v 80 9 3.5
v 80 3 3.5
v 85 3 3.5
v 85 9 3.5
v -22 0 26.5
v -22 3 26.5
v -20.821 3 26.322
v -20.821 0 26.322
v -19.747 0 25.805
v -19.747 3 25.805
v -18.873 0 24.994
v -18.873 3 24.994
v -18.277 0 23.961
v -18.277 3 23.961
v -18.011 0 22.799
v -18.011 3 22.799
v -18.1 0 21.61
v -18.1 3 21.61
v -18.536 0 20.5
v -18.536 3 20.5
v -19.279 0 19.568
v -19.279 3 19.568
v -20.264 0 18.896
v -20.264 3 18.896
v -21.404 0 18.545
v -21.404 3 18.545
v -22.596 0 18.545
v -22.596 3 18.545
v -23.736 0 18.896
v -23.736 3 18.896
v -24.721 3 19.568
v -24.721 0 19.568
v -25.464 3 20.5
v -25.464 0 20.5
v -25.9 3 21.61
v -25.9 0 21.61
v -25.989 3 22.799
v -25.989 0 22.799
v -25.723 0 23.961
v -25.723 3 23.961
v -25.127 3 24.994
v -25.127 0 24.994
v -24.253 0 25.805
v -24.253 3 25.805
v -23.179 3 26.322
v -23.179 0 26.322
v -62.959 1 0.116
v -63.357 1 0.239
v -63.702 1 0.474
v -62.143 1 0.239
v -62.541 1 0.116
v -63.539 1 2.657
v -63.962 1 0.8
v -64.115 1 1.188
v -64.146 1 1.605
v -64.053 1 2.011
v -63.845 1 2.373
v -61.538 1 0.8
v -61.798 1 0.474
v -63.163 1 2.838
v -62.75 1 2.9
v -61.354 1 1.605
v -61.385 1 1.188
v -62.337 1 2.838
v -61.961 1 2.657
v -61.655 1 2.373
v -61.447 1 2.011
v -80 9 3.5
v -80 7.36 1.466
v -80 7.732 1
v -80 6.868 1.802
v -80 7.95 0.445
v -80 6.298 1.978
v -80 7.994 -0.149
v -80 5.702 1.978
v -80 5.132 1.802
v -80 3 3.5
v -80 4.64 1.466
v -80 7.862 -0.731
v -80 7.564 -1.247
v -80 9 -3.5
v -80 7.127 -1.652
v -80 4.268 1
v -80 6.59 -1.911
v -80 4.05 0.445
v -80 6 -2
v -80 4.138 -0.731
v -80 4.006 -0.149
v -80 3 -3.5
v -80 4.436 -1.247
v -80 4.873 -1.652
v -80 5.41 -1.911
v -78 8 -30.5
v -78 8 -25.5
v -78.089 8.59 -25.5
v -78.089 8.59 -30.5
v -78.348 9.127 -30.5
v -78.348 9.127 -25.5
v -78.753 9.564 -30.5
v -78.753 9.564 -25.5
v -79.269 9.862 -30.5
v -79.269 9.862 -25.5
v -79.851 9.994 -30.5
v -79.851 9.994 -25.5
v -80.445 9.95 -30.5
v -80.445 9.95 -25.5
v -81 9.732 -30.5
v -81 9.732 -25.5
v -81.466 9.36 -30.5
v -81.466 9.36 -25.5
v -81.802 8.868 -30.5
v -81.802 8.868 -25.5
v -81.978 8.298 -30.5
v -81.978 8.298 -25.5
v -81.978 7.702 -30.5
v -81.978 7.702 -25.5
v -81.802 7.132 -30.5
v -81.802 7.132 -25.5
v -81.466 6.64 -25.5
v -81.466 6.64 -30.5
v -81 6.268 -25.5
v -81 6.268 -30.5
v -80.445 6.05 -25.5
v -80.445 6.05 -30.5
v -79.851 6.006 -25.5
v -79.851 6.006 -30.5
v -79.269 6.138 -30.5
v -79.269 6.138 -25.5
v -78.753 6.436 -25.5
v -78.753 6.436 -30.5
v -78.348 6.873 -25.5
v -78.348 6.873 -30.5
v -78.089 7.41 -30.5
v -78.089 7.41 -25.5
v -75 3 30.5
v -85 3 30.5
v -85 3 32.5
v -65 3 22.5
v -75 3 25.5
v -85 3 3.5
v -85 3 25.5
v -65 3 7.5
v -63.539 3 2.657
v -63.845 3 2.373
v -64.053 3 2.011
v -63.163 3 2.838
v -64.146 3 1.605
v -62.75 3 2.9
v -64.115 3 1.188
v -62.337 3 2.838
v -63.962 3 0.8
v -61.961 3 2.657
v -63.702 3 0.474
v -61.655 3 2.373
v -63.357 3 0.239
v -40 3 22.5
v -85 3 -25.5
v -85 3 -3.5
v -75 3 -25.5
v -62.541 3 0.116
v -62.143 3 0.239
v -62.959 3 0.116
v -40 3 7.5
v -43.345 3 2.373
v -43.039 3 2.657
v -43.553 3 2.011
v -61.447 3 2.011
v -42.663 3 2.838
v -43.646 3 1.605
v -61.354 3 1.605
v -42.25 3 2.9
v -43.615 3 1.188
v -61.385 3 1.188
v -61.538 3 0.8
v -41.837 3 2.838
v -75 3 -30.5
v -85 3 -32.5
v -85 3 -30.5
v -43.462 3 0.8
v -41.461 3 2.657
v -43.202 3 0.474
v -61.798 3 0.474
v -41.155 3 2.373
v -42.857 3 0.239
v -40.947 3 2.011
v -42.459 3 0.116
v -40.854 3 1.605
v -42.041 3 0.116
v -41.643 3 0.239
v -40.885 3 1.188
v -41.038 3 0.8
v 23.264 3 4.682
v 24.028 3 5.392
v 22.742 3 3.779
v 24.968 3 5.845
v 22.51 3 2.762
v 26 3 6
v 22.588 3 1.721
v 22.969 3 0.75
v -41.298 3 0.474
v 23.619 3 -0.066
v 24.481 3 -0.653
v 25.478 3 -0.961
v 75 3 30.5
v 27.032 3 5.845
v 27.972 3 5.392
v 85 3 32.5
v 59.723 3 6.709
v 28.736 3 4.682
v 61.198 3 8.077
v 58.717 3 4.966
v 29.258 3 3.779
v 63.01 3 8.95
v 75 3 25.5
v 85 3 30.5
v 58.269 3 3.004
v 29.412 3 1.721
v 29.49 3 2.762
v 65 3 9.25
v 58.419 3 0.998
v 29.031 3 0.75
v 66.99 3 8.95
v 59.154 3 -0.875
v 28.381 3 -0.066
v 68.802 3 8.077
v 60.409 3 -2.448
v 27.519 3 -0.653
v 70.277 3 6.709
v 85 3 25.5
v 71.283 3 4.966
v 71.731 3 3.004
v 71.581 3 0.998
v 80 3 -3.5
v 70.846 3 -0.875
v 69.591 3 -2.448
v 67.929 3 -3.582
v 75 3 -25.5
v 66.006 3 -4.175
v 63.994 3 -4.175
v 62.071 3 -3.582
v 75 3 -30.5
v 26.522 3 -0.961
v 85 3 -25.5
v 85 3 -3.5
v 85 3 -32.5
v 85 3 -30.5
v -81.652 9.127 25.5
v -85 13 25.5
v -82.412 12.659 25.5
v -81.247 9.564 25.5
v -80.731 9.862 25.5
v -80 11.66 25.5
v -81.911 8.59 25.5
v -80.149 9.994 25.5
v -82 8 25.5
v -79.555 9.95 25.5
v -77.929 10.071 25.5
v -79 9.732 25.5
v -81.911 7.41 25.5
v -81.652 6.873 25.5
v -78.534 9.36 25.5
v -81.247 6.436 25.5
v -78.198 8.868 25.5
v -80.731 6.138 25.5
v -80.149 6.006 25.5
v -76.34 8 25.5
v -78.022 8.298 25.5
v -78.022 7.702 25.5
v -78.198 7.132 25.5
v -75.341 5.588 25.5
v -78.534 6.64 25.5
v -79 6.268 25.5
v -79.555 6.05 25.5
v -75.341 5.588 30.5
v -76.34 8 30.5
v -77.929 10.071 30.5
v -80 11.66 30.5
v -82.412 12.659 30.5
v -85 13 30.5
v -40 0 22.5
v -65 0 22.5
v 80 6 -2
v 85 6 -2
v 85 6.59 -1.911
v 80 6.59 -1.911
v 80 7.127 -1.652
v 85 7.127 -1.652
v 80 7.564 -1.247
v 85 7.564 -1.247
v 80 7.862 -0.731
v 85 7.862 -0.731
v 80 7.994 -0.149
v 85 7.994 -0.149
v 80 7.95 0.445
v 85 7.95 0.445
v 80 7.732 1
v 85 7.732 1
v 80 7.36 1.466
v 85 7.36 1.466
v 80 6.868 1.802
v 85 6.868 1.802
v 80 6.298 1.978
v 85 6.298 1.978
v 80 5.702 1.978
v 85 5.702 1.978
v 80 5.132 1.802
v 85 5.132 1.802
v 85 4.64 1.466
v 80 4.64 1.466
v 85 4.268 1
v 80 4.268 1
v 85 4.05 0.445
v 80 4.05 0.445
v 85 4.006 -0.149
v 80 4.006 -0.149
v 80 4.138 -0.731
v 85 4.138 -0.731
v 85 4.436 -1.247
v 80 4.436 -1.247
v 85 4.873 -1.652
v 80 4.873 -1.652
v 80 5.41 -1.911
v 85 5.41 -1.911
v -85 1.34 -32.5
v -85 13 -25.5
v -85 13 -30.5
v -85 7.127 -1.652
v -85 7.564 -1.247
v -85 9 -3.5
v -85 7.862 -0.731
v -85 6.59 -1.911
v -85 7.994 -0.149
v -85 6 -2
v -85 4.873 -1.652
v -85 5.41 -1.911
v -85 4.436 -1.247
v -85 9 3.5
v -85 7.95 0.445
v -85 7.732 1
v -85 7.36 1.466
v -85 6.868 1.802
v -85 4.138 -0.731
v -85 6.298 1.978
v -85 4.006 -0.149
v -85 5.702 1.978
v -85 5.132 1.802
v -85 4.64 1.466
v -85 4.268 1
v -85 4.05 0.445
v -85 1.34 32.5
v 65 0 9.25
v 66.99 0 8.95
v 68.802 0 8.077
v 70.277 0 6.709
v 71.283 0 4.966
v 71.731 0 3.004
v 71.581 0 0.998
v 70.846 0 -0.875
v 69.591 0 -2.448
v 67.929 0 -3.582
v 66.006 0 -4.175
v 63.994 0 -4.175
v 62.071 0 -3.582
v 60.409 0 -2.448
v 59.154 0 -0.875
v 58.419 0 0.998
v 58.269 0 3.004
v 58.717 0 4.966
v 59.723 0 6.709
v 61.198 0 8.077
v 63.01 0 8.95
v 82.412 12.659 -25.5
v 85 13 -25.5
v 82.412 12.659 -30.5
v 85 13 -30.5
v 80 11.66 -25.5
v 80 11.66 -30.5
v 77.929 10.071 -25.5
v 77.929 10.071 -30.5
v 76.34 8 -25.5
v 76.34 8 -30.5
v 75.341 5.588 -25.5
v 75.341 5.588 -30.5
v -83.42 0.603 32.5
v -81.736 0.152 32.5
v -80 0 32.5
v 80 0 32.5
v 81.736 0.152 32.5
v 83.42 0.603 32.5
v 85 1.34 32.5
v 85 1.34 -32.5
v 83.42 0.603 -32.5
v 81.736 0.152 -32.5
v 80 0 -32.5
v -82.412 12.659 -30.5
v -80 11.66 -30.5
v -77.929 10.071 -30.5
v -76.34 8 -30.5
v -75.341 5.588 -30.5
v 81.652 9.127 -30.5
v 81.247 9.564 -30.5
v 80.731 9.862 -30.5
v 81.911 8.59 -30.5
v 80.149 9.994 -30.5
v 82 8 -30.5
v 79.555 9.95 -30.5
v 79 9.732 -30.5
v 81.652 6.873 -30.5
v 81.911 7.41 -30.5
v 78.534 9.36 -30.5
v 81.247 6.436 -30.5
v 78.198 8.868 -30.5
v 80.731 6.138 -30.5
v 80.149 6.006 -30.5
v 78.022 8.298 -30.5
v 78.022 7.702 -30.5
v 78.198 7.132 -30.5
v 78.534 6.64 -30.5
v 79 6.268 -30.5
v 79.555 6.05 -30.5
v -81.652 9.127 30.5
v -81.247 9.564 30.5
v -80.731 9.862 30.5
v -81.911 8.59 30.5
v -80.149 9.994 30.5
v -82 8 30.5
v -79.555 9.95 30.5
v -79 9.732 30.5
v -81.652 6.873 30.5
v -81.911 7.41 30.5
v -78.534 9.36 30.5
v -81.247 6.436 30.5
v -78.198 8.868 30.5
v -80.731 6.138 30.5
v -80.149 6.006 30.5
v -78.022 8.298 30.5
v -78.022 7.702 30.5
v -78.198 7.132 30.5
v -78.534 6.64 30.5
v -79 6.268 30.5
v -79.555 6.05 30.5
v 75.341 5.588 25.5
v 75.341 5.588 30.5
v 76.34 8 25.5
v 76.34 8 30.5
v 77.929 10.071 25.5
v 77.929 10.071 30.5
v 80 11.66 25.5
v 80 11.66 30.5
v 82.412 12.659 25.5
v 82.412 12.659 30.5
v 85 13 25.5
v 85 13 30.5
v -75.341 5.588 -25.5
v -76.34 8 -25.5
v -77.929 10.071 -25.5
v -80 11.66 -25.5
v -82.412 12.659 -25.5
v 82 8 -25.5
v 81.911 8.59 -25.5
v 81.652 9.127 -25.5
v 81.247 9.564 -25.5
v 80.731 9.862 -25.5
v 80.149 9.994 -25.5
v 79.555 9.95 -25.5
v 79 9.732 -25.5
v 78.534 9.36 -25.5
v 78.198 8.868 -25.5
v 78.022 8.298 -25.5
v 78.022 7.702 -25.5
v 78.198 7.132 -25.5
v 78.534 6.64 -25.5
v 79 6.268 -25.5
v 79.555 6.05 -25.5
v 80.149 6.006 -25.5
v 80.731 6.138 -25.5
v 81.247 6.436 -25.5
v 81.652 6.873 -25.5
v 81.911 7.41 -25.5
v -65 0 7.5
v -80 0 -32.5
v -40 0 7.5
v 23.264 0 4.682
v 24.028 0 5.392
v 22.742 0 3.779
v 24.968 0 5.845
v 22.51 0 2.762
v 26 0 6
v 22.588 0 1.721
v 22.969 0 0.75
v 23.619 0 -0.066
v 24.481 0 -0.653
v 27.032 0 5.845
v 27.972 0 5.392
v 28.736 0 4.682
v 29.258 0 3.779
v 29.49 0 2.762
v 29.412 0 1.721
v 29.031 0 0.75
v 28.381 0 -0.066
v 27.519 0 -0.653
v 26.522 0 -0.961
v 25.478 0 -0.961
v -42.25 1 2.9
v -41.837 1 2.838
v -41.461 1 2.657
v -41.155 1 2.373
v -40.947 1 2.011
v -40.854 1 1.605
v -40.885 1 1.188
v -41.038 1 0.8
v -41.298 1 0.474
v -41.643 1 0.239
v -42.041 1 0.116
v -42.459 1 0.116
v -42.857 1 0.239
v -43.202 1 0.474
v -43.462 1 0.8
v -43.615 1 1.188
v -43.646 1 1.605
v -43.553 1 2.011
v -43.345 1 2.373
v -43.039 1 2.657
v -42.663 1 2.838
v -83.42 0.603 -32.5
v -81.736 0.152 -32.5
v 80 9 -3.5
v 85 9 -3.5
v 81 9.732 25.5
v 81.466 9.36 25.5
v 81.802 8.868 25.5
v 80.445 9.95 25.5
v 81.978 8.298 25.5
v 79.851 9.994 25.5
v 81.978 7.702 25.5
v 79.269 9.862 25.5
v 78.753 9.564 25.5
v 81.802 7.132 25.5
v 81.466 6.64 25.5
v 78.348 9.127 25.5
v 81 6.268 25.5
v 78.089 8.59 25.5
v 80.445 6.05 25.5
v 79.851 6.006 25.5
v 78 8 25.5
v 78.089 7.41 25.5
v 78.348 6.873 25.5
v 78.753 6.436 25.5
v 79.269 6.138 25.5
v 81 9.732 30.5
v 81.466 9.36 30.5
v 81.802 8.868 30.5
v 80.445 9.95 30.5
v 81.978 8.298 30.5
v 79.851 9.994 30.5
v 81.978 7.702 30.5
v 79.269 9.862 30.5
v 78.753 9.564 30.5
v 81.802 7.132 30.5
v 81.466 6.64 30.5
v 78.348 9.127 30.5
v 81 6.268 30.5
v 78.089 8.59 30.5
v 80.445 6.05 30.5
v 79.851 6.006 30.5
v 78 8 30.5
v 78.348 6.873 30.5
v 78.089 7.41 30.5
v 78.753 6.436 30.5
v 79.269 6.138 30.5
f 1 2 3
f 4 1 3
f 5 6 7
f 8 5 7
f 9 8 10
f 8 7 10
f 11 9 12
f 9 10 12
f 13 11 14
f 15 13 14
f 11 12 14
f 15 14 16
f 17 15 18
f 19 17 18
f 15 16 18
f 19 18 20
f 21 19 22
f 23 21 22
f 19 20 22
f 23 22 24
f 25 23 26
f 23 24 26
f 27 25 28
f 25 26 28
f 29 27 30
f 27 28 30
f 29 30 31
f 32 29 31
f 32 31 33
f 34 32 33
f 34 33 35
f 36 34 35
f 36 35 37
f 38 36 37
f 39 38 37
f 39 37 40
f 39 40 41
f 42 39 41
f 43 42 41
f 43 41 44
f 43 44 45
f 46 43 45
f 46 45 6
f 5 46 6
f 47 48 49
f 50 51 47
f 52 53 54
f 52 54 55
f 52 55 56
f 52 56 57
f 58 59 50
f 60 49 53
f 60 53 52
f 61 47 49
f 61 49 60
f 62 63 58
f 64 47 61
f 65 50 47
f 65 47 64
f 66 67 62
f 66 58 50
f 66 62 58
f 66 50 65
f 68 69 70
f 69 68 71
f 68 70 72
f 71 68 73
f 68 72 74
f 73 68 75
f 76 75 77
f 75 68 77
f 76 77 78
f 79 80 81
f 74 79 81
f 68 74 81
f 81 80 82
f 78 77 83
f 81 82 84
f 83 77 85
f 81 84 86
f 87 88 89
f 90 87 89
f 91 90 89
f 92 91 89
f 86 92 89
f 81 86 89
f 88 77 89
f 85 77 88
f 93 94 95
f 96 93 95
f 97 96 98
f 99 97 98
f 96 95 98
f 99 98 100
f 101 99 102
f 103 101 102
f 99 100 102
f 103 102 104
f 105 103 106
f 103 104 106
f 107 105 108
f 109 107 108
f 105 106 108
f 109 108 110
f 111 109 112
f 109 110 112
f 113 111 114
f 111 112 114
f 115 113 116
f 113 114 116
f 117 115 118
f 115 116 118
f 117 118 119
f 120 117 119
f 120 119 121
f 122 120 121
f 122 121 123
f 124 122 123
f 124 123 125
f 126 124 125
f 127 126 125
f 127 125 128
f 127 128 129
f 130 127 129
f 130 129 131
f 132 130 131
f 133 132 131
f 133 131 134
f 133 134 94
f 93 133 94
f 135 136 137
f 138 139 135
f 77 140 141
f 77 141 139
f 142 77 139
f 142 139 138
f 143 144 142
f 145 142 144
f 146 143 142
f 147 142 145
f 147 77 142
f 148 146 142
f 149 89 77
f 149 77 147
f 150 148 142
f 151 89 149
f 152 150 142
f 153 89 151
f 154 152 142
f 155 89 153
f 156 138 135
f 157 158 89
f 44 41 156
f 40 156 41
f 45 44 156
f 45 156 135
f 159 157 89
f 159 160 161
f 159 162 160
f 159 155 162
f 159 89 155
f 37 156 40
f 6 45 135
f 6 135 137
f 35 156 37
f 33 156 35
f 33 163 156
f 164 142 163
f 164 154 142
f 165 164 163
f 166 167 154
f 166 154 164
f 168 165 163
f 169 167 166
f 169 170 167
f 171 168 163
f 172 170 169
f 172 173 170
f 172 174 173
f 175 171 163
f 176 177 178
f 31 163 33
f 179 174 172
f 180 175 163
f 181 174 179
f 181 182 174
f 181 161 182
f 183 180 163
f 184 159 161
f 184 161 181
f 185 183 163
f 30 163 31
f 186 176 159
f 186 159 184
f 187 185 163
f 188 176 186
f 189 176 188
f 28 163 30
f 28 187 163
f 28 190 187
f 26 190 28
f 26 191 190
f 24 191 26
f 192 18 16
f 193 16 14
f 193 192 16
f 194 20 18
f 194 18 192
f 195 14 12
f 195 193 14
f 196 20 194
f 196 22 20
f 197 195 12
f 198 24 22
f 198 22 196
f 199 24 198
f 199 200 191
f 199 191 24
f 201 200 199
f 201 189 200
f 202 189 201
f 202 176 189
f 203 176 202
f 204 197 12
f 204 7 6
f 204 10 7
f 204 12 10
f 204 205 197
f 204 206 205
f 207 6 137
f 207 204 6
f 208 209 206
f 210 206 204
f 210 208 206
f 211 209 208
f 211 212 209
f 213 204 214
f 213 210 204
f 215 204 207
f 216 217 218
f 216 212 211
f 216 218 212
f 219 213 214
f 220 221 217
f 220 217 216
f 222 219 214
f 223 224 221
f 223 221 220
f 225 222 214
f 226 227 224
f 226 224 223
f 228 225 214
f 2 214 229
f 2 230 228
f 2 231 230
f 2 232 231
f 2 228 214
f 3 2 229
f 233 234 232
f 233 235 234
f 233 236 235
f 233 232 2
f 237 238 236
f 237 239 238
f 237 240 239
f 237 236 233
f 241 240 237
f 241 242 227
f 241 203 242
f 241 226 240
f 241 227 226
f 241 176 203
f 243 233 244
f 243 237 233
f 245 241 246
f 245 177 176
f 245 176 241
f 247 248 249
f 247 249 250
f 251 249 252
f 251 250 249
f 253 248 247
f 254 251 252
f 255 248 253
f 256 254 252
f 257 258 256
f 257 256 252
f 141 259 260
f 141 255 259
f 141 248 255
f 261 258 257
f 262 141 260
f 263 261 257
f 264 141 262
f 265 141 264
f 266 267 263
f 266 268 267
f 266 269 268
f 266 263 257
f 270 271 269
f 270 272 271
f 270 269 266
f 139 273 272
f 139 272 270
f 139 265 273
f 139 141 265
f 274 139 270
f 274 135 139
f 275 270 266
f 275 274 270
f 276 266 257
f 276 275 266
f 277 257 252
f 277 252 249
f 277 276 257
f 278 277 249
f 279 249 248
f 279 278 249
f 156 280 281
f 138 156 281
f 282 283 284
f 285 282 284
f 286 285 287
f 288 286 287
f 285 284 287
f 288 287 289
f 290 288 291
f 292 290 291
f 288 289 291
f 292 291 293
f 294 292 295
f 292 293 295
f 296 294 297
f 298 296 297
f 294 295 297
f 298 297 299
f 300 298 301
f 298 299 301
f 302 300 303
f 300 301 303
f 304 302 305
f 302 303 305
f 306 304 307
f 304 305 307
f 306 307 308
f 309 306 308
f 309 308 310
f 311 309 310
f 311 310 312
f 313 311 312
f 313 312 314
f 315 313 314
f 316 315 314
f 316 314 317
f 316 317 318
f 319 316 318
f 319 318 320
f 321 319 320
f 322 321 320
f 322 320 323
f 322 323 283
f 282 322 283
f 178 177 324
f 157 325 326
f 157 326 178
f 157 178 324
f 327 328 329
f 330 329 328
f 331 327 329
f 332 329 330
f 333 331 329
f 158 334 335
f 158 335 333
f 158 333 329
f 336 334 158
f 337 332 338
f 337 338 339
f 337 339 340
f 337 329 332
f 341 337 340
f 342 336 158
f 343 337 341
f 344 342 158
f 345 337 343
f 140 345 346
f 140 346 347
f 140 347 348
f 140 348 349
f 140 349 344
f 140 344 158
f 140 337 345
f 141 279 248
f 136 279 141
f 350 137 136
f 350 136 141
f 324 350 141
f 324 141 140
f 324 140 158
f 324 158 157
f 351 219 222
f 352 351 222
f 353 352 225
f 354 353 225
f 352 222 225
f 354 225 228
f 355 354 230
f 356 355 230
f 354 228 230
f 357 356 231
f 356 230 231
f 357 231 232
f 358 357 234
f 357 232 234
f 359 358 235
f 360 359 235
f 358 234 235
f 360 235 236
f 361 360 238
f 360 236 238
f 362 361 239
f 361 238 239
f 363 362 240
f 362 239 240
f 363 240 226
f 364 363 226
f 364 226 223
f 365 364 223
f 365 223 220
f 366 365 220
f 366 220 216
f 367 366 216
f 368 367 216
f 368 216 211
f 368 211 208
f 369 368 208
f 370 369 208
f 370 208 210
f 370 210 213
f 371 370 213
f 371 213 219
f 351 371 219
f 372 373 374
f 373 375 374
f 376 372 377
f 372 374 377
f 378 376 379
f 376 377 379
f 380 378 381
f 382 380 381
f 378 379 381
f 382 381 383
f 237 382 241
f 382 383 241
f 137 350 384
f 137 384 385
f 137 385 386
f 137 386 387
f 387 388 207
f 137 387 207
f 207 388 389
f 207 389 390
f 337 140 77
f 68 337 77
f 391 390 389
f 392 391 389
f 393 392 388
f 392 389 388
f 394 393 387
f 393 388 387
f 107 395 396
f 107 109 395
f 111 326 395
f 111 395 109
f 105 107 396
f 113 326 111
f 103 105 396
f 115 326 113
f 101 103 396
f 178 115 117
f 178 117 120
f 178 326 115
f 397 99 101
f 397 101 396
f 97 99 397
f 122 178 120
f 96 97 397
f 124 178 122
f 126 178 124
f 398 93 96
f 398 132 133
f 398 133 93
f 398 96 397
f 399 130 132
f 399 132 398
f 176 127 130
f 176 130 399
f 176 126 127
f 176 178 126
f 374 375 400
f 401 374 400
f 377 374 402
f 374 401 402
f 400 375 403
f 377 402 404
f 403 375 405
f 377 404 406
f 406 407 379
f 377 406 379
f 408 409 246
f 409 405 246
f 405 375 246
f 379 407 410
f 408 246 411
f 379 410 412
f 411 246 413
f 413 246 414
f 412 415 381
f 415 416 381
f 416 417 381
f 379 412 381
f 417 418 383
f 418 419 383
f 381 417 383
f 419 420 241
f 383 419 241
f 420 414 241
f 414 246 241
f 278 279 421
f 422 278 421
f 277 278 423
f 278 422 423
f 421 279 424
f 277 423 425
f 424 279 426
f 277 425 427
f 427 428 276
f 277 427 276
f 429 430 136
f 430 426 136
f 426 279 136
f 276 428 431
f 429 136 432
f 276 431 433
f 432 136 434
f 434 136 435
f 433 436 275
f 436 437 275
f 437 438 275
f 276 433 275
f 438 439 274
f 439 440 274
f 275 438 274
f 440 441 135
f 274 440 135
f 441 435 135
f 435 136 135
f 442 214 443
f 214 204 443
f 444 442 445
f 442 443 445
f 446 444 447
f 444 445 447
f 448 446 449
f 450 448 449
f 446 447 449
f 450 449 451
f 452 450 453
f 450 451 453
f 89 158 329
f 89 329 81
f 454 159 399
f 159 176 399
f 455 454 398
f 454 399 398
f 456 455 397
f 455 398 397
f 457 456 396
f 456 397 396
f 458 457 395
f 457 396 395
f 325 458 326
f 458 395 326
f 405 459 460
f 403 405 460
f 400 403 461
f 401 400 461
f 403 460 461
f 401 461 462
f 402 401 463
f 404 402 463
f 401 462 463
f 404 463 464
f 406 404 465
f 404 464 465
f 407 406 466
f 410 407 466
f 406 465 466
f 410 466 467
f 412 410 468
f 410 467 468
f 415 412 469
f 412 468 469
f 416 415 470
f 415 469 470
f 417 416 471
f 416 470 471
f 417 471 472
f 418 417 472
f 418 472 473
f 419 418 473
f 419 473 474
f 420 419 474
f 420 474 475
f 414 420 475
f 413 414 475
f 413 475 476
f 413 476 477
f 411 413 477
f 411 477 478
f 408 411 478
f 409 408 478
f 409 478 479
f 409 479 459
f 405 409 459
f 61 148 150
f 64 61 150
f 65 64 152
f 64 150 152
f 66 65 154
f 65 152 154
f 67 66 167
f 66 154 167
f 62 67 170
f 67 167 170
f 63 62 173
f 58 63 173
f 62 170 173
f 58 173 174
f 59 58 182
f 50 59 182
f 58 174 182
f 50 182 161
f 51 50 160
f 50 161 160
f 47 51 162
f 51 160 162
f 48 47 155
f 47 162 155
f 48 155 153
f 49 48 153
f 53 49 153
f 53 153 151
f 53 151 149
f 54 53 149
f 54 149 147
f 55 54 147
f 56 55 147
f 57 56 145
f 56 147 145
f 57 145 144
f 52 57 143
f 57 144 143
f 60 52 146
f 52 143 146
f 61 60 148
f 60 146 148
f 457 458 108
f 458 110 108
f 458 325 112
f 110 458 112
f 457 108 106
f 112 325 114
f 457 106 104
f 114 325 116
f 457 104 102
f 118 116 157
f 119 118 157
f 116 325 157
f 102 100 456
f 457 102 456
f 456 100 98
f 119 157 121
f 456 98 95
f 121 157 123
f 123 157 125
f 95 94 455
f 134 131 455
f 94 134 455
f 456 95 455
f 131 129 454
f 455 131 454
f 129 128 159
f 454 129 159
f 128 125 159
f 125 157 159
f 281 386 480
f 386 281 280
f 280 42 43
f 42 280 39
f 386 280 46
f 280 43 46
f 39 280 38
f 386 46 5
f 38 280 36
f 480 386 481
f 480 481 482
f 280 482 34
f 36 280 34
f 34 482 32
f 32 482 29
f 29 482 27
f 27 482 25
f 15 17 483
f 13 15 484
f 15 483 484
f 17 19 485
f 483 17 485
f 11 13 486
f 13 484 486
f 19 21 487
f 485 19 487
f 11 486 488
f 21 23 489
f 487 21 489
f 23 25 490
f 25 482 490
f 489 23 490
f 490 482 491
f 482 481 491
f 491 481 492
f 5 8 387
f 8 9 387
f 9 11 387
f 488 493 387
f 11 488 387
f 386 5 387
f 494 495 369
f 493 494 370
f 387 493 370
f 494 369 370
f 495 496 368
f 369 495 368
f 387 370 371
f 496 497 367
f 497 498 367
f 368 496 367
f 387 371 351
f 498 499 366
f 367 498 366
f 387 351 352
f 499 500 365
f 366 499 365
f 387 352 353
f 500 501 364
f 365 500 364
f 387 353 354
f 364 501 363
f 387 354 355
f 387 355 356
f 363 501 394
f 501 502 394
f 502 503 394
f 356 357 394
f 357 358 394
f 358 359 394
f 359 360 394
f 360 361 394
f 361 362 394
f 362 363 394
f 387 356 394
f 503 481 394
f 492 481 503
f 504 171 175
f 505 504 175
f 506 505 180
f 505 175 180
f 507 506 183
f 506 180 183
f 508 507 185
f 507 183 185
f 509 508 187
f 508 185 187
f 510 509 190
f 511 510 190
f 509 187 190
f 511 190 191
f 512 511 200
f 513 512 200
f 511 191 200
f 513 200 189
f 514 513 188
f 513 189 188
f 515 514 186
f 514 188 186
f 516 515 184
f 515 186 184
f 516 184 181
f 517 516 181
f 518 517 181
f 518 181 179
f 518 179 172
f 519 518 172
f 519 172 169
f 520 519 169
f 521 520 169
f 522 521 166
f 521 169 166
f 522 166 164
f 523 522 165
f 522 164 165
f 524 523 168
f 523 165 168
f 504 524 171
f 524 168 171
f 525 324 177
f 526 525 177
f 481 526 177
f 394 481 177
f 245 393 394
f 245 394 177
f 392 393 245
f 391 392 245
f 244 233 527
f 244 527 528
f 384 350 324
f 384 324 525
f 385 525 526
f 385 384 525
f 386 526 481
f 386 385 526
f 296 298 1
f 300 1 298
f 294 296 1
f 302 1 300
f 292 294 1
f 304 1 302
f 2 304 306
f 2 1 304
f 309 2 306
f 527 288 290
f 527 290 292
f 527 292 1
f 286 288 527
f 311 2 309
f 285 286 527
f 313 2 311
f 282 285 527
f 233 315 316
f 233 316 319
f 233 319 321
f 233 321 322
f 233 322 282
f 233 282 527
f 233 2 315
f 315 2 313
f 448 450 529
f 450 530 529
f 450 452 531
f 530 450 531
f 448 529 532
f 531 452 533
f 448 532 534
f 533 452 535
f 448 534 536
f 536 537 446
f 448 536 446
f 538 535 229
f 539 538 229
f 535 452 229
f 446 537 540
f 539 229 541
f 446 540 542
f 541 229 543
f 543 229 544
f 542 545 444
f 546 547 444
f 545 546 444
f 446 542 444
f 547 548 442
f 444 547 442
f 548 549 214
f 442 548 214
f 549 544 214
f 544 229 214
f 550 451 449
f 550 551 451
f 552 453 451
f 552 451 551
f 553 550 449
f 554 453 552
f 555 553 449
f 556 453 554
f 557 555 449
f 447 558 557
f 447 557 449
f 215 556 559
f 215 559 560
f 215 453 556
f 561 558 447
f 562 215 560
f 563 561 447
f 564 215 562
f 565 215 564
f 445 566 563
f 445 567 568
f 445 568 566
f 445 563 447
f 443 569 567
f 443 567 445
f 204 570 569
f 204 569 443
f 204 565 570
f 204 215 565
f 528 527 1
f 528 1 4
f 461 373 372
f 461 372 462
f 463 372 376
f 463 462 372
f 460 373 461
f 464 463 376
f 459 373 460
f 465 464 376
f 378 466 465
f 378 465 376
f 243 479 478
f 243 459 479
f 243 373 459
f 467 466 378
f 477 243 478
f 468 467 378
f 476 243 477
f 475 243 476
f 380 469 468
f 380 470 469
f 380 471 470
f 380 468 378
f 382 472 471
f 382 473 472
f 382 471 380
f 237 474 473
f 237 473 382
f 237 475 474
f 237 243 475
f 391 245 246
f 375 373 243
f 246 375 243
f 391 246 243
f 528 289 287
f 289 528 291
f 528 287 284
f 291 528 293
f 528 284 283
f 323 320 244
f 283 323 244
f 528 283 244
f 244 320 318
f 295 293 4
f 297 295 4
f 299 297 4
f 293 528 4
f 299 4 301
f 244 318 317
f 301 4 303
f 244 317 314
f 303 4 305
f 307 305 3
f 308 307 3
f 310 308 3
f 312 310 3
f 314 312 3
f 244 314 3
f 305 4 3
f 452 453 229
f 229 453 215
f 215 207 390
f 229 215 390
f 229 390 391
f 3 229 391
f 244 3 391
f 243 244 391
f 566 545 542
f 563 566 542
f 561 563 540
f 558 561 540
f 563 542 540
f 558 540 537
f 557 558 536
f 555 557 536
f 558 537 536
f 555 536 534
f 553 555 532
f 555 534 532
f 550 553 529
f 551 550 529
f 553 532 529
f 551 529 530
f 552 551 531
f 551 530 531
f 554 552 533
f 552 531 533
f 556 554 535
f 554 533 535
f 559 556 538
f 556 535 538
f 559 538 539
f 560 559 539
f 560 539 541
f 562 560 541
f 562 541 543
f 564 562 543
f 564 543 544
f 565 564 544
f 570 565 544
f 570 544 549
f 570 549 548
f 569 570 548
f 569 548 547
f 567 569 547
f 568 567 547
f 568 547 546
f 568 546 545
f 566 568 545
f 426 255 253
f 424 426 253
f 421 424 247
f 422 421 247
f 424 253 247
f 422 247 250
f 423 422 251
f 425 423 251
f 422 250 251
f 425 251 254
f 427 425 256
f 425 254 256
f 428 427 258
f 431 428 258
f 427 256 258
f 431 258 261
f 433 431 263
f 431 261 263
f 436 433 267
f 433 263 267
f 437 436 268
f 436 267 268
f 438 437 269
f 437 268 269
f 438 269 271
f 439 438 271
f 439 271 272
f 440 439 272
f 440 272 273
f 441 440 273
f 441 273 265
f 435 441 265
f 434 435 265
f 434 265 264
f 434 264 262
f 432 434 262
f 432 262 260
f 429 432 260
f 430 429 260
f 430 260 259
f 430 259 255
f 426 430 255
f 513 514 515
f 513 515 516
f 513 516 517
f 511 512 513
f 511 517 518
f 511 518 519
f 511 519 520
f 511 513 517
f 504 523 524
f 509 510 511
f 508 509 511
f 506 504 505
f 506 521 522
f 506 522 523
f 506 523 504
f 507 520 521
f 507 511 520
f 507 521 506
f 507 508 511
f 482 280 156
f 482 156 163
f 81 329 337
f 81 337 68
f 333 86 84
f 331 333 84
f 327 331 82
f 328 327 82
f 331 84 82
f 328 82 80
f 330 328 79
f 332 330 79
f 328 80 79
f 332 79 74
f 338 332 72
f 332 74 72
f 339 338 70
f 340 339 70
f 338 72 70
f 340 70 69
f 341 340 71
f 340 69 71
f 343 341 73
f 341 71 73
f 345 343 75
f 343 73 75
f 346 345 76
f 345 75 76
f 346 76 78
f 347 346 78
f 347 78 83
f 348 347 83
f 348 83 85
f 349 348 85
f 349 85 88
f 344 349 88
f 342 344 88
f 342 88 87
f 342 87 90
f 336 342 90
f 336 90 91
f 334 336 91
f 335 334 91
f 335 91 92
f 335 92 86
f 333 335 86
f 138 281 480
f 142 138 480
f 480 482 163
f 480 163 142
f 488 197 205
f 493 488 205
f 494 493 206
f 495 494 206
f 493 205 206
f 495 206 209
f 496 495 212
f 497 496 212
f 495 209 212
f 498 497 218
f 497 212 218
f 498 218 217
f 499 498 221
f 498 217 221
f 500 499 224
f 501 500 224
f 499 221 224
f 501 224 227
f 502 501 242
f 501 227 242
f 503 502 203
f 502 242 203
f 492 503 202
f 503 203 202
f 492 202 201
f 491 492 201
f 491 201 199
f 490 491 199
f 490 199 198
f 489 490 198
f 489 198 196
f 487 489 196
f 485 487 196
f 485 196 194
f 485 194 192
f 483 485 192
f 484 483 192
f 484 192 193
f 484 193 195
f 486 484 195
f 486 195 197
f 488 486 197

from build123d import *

# Parameters (mm, degrees)
SKIZZE1_W                                  = 180
SKIZZE1_H                                  = 65
AUFSATZ_LINEAR_AUSTRAGEN1_DEPTH            = 3
SKIZZE2_W                                  = 25
SKIZZE2_H                                  = 15
SCHNITT_LINEAR_AUSTRAGEN1_DEPTH            = 3
SKIZZE3_W                                  = 5
SKIZZE3_H                                  = 7
AUFSATZ_LINEAR_AUSTRAGEN2_DEPTH            = 6
F_4_0_4_DURCHMESSER_BOHRUNG1_D             = 4
SCHNITT_LINEAR_AUSTRAGEN4_DEPTH            = 112.382224794
SKIZZE7_W                                  = 10
SKIZZE7_H                                  = 5
AUFSATZ_LINEAR_AUSTRAGEN3_DEPTH            = 10
SPIEGELN1_AT_THE_SECOND_PLANE_COPY_1_SKE_W = 10
SPIEGELN1_AT_THE_SECOND_PLANE_COPY_1_SKE_H = 5
SPIEGELN1_AT_THE_SECOND_PLANE_COPY_1_DEPTH = 10
VERRUNDUNG2_R                              = 10
F_4_0_4_DURCHMESSER_BOHRUNG3_D             = 4
F_4_0_4_DURCHMESSER_BOHRUNG3_DEPTH         = 5
F_4_0_4_DURCHMESSER_BOHRUNG4_D             = 4
F_4_0_4_DURCHMESSER_BOHRUNG4_DEPTH         = 5
SKIZZE14_R                                 = 3.5
SKIZZE14_R_2                               = 6.75
SKIZZE14_R_3                               = 4
SCHNITT_LINEAR_AUSTRAGEN5_DEPTH            = 92.549167118
SKIZZE17_R                                 = 1.4
SCHNITT_LINEAR_AUSTRAGEN6_DEPTH            = 2


with BuildPart() as part:
    # Skizze1 → Aufsatz-Linear austragen1 (new body)
    with BuildSketch(Plane(origin=(0, 0, 0), x_dir=(1, 0, 0), z_dir=(0, 1, 0))):
        Rectangle(SKIZZE1_W, SKIZZE1_H)
    extrude(amount=AUFSATZ_LINEAR_AUSTRAGEN1_DEPTH)

    # Skizze2 → Schnitt-Linear austragen1 (cut)
    with BuildSketch(Plane(origin=(0, 0, 0), x_dir=(-1, 0, 0), z_dir=(0, -1, 0))):
        with Locations((52.5, -15)):
            Rectangle(SKIZZE2_W, SKIZZE2_H)
    extrude(amount=-SCHNITT_LINEAR_AUSTRAGEN1_DEPTH, mode=Mode.SUBTRACT)

    # Skizze3 → Aufsatz-Linear austragen2 (add)
    with BuildSketch(Plane(origin=(0, 3, 0), x_dir=(1, 0, 0), z_dir=(0, 1, 0))):
        with Locations((-82.5, 0)):
            Rectangle(SKIZZE3_W, SKIZZE3_H)
        with Locations((82.5, 0)):
            Rectangle(SKIZZE3_W, SKIZZE3_H)
    extrude(amount=AUFSATZ_LINEAR_AUSTRAGEN2_DEPTH)

    # Ø4.0 (4) Durchmesser Bohrung1 (through all)
    with Locations(Plane.ZY.offset(85)):
        with Locations((0, 6)):
            Hole(F_4_0_4_DURCHMESSER_BOHRUNG1_D / 2)

    # Skizze4 → Schnitt-Linear austragen4 (cut, through all)
    with BuildSketch(Plane.XY.offset(32.5)):
        with BuildLine():
            Line((-80, 0), (-90, 0))
            Line((-90, 0), (-90, 3))
            Line((-90, 3), (-85, 3))
            Line((-85, 3), (-85, 1.339745962))
            ThreePointArc((-85, 1.339745962), (-82.588190451, 0.340741737), (-80, 0))
        make_face()
        with BuildLine():
            Line((80, 0), (90, 0))
            Line((90, 0), (90, 3))
            Line((90, 3), (85, 3))
            Line((85, 3), (85, 1.339745962))
            ThreePointArc((85, 1.339745962), (82.588190451, 0.340741737), (80, 0))
        make_face()
    extrude(amount=-SCHNITT_LINEAR_AUSTRAGEN4_DEPTH, mode=Mode.SUBTRACT)

    # Skizze7 → Aufsatz-Linear austragen3 (add)
    with BuildSketch(Plane(origin=(0, 3, 0), x_dir=(1, 0, 0), z_dir=(0, 1, 0))):
        with Locations((-80, 28)):
            Rectangle(SKIZZE7_W, SKIZZE7_H)
    aufsatz_linear_austragen3 = extrude(amount=AUFSATZ_LINEAR_AUSTRAGEN3_DEPTH)

    # Spiegeln1: Aufsatz-Linear austragen3 across plane
    add(aufsatz_linear_austragen3.mirror(Plane(origin=(0, 0, 0), x_dir=(0, 0, 1), z_dir=(1, 0, 0))))

    # Spiegeln1 at the second plane: Aufsatz-Linear austragen3 across plane
    add(aufsatz_linear_austragen3.mirror(Plane.XY))

    # Spiegeln1 at the second plane copy 1 ske → Spiegeln1 at the second plane copy 1 (add)
    with BuildSketch(Plane(origin=(0, 3, 0), x_dir=(-1, 0, 0), z_dir=(0, 1, 0))):
        with Locations((-80, 28)):
            Rectangle(SPIEGELN1_AT_THE_SECOND_PLANE_COPY_1_SKE_W, SPIEGELN1_AT_THE_SECOND_PLANE_COPY_1_SKE_H)
    extrude(amount=SPIEGELN1_AT_THE_SECOND_PLANE_COPY_1_DEPTH)

    # Verrundung2
    verrundung2_edges = [part.edges().sort_by_distance(p)[0] for p in [
        (-75, 13, -28),
        (-75, 13, 28),
        (75, 13, -28),
        (75, 13, 28),
    ]]
    fillet(verrundung2_edges, radius=VERRUNDUNG2_R - 0.0001)  # a hair under: the kernel refuses the full size

    # Ø4.0 (4) Durchmesser Bohrung3
    with Locations(Plane(origin=(0, 0, -30.5), x_dir=(-1, 0, 0), z_dir=(0, 0, -1))):
        with Locations((-80, 8), (80, 8)):
            Hole(F_4_0_4_DURCHMESSER_BOHRUNG3_D / 2, depth=F_4_0_4_DURCHMESSER_BOHRUNG3_DEPTH)

    # Ø4.0 (4) Durchmesser Bohrung4
    with Locations(Plane.XY.offset(30.5)):
        with Locations((-80, 8), (80, 8)):
            Hole(F_4_0_4_DURCHMESSER_BOHRUNG4_D / 2, depth=F_4_0_4_DURCHMESSER_BOHRUNG4_DEPTH)

    # Skizze14 → Schnitt-Linear austragen5 (cut, through all)
    with BuildSketch(Plane(origin=(0, 3, 0), x_dir=(1, 0, 0), z_dir=(0, 1, 0))):
        with Locations(Location((26, -2.5, 0), (0, 0, 270))):
            Circle(SKIZZE14_R)
        with Locations(Location((65, -2.5, 0), (0, 0, 270))):
            Circle(SKIZZE14_R_2)
        with Locations(Location((-22, -22.5, 0), (0, 0, 270))):
            Circle(SKIZZE14_R_3)
    extrude(amount=-SCHNITT_LINEAR_AUSTRAGEN5_DEPTH, mode=Mode.SUBTRACT)

    # Skizze17 → Schnitt-Linear austragen6 (cut)
    with BuildSketch(Plane(origin=(0, 3, 0), x_dir=(1, 0, 0), z_dir=(0, 1, 0))):
        with Locations(Location((-62.75, -1.5, 0), (0, 0, 270))):
            Circle(SKIZZE17_R)
        with Locations(Location((-42.25, -1.5, 0), (0, 0, 270))):
            Circle(SKIZZE17_R)
    extrude(amount=-SCHNITT_LINEAR_AUSTRAGEN6_DEPTH, mode=Mode.SUBTRACT)


solid = part.part
